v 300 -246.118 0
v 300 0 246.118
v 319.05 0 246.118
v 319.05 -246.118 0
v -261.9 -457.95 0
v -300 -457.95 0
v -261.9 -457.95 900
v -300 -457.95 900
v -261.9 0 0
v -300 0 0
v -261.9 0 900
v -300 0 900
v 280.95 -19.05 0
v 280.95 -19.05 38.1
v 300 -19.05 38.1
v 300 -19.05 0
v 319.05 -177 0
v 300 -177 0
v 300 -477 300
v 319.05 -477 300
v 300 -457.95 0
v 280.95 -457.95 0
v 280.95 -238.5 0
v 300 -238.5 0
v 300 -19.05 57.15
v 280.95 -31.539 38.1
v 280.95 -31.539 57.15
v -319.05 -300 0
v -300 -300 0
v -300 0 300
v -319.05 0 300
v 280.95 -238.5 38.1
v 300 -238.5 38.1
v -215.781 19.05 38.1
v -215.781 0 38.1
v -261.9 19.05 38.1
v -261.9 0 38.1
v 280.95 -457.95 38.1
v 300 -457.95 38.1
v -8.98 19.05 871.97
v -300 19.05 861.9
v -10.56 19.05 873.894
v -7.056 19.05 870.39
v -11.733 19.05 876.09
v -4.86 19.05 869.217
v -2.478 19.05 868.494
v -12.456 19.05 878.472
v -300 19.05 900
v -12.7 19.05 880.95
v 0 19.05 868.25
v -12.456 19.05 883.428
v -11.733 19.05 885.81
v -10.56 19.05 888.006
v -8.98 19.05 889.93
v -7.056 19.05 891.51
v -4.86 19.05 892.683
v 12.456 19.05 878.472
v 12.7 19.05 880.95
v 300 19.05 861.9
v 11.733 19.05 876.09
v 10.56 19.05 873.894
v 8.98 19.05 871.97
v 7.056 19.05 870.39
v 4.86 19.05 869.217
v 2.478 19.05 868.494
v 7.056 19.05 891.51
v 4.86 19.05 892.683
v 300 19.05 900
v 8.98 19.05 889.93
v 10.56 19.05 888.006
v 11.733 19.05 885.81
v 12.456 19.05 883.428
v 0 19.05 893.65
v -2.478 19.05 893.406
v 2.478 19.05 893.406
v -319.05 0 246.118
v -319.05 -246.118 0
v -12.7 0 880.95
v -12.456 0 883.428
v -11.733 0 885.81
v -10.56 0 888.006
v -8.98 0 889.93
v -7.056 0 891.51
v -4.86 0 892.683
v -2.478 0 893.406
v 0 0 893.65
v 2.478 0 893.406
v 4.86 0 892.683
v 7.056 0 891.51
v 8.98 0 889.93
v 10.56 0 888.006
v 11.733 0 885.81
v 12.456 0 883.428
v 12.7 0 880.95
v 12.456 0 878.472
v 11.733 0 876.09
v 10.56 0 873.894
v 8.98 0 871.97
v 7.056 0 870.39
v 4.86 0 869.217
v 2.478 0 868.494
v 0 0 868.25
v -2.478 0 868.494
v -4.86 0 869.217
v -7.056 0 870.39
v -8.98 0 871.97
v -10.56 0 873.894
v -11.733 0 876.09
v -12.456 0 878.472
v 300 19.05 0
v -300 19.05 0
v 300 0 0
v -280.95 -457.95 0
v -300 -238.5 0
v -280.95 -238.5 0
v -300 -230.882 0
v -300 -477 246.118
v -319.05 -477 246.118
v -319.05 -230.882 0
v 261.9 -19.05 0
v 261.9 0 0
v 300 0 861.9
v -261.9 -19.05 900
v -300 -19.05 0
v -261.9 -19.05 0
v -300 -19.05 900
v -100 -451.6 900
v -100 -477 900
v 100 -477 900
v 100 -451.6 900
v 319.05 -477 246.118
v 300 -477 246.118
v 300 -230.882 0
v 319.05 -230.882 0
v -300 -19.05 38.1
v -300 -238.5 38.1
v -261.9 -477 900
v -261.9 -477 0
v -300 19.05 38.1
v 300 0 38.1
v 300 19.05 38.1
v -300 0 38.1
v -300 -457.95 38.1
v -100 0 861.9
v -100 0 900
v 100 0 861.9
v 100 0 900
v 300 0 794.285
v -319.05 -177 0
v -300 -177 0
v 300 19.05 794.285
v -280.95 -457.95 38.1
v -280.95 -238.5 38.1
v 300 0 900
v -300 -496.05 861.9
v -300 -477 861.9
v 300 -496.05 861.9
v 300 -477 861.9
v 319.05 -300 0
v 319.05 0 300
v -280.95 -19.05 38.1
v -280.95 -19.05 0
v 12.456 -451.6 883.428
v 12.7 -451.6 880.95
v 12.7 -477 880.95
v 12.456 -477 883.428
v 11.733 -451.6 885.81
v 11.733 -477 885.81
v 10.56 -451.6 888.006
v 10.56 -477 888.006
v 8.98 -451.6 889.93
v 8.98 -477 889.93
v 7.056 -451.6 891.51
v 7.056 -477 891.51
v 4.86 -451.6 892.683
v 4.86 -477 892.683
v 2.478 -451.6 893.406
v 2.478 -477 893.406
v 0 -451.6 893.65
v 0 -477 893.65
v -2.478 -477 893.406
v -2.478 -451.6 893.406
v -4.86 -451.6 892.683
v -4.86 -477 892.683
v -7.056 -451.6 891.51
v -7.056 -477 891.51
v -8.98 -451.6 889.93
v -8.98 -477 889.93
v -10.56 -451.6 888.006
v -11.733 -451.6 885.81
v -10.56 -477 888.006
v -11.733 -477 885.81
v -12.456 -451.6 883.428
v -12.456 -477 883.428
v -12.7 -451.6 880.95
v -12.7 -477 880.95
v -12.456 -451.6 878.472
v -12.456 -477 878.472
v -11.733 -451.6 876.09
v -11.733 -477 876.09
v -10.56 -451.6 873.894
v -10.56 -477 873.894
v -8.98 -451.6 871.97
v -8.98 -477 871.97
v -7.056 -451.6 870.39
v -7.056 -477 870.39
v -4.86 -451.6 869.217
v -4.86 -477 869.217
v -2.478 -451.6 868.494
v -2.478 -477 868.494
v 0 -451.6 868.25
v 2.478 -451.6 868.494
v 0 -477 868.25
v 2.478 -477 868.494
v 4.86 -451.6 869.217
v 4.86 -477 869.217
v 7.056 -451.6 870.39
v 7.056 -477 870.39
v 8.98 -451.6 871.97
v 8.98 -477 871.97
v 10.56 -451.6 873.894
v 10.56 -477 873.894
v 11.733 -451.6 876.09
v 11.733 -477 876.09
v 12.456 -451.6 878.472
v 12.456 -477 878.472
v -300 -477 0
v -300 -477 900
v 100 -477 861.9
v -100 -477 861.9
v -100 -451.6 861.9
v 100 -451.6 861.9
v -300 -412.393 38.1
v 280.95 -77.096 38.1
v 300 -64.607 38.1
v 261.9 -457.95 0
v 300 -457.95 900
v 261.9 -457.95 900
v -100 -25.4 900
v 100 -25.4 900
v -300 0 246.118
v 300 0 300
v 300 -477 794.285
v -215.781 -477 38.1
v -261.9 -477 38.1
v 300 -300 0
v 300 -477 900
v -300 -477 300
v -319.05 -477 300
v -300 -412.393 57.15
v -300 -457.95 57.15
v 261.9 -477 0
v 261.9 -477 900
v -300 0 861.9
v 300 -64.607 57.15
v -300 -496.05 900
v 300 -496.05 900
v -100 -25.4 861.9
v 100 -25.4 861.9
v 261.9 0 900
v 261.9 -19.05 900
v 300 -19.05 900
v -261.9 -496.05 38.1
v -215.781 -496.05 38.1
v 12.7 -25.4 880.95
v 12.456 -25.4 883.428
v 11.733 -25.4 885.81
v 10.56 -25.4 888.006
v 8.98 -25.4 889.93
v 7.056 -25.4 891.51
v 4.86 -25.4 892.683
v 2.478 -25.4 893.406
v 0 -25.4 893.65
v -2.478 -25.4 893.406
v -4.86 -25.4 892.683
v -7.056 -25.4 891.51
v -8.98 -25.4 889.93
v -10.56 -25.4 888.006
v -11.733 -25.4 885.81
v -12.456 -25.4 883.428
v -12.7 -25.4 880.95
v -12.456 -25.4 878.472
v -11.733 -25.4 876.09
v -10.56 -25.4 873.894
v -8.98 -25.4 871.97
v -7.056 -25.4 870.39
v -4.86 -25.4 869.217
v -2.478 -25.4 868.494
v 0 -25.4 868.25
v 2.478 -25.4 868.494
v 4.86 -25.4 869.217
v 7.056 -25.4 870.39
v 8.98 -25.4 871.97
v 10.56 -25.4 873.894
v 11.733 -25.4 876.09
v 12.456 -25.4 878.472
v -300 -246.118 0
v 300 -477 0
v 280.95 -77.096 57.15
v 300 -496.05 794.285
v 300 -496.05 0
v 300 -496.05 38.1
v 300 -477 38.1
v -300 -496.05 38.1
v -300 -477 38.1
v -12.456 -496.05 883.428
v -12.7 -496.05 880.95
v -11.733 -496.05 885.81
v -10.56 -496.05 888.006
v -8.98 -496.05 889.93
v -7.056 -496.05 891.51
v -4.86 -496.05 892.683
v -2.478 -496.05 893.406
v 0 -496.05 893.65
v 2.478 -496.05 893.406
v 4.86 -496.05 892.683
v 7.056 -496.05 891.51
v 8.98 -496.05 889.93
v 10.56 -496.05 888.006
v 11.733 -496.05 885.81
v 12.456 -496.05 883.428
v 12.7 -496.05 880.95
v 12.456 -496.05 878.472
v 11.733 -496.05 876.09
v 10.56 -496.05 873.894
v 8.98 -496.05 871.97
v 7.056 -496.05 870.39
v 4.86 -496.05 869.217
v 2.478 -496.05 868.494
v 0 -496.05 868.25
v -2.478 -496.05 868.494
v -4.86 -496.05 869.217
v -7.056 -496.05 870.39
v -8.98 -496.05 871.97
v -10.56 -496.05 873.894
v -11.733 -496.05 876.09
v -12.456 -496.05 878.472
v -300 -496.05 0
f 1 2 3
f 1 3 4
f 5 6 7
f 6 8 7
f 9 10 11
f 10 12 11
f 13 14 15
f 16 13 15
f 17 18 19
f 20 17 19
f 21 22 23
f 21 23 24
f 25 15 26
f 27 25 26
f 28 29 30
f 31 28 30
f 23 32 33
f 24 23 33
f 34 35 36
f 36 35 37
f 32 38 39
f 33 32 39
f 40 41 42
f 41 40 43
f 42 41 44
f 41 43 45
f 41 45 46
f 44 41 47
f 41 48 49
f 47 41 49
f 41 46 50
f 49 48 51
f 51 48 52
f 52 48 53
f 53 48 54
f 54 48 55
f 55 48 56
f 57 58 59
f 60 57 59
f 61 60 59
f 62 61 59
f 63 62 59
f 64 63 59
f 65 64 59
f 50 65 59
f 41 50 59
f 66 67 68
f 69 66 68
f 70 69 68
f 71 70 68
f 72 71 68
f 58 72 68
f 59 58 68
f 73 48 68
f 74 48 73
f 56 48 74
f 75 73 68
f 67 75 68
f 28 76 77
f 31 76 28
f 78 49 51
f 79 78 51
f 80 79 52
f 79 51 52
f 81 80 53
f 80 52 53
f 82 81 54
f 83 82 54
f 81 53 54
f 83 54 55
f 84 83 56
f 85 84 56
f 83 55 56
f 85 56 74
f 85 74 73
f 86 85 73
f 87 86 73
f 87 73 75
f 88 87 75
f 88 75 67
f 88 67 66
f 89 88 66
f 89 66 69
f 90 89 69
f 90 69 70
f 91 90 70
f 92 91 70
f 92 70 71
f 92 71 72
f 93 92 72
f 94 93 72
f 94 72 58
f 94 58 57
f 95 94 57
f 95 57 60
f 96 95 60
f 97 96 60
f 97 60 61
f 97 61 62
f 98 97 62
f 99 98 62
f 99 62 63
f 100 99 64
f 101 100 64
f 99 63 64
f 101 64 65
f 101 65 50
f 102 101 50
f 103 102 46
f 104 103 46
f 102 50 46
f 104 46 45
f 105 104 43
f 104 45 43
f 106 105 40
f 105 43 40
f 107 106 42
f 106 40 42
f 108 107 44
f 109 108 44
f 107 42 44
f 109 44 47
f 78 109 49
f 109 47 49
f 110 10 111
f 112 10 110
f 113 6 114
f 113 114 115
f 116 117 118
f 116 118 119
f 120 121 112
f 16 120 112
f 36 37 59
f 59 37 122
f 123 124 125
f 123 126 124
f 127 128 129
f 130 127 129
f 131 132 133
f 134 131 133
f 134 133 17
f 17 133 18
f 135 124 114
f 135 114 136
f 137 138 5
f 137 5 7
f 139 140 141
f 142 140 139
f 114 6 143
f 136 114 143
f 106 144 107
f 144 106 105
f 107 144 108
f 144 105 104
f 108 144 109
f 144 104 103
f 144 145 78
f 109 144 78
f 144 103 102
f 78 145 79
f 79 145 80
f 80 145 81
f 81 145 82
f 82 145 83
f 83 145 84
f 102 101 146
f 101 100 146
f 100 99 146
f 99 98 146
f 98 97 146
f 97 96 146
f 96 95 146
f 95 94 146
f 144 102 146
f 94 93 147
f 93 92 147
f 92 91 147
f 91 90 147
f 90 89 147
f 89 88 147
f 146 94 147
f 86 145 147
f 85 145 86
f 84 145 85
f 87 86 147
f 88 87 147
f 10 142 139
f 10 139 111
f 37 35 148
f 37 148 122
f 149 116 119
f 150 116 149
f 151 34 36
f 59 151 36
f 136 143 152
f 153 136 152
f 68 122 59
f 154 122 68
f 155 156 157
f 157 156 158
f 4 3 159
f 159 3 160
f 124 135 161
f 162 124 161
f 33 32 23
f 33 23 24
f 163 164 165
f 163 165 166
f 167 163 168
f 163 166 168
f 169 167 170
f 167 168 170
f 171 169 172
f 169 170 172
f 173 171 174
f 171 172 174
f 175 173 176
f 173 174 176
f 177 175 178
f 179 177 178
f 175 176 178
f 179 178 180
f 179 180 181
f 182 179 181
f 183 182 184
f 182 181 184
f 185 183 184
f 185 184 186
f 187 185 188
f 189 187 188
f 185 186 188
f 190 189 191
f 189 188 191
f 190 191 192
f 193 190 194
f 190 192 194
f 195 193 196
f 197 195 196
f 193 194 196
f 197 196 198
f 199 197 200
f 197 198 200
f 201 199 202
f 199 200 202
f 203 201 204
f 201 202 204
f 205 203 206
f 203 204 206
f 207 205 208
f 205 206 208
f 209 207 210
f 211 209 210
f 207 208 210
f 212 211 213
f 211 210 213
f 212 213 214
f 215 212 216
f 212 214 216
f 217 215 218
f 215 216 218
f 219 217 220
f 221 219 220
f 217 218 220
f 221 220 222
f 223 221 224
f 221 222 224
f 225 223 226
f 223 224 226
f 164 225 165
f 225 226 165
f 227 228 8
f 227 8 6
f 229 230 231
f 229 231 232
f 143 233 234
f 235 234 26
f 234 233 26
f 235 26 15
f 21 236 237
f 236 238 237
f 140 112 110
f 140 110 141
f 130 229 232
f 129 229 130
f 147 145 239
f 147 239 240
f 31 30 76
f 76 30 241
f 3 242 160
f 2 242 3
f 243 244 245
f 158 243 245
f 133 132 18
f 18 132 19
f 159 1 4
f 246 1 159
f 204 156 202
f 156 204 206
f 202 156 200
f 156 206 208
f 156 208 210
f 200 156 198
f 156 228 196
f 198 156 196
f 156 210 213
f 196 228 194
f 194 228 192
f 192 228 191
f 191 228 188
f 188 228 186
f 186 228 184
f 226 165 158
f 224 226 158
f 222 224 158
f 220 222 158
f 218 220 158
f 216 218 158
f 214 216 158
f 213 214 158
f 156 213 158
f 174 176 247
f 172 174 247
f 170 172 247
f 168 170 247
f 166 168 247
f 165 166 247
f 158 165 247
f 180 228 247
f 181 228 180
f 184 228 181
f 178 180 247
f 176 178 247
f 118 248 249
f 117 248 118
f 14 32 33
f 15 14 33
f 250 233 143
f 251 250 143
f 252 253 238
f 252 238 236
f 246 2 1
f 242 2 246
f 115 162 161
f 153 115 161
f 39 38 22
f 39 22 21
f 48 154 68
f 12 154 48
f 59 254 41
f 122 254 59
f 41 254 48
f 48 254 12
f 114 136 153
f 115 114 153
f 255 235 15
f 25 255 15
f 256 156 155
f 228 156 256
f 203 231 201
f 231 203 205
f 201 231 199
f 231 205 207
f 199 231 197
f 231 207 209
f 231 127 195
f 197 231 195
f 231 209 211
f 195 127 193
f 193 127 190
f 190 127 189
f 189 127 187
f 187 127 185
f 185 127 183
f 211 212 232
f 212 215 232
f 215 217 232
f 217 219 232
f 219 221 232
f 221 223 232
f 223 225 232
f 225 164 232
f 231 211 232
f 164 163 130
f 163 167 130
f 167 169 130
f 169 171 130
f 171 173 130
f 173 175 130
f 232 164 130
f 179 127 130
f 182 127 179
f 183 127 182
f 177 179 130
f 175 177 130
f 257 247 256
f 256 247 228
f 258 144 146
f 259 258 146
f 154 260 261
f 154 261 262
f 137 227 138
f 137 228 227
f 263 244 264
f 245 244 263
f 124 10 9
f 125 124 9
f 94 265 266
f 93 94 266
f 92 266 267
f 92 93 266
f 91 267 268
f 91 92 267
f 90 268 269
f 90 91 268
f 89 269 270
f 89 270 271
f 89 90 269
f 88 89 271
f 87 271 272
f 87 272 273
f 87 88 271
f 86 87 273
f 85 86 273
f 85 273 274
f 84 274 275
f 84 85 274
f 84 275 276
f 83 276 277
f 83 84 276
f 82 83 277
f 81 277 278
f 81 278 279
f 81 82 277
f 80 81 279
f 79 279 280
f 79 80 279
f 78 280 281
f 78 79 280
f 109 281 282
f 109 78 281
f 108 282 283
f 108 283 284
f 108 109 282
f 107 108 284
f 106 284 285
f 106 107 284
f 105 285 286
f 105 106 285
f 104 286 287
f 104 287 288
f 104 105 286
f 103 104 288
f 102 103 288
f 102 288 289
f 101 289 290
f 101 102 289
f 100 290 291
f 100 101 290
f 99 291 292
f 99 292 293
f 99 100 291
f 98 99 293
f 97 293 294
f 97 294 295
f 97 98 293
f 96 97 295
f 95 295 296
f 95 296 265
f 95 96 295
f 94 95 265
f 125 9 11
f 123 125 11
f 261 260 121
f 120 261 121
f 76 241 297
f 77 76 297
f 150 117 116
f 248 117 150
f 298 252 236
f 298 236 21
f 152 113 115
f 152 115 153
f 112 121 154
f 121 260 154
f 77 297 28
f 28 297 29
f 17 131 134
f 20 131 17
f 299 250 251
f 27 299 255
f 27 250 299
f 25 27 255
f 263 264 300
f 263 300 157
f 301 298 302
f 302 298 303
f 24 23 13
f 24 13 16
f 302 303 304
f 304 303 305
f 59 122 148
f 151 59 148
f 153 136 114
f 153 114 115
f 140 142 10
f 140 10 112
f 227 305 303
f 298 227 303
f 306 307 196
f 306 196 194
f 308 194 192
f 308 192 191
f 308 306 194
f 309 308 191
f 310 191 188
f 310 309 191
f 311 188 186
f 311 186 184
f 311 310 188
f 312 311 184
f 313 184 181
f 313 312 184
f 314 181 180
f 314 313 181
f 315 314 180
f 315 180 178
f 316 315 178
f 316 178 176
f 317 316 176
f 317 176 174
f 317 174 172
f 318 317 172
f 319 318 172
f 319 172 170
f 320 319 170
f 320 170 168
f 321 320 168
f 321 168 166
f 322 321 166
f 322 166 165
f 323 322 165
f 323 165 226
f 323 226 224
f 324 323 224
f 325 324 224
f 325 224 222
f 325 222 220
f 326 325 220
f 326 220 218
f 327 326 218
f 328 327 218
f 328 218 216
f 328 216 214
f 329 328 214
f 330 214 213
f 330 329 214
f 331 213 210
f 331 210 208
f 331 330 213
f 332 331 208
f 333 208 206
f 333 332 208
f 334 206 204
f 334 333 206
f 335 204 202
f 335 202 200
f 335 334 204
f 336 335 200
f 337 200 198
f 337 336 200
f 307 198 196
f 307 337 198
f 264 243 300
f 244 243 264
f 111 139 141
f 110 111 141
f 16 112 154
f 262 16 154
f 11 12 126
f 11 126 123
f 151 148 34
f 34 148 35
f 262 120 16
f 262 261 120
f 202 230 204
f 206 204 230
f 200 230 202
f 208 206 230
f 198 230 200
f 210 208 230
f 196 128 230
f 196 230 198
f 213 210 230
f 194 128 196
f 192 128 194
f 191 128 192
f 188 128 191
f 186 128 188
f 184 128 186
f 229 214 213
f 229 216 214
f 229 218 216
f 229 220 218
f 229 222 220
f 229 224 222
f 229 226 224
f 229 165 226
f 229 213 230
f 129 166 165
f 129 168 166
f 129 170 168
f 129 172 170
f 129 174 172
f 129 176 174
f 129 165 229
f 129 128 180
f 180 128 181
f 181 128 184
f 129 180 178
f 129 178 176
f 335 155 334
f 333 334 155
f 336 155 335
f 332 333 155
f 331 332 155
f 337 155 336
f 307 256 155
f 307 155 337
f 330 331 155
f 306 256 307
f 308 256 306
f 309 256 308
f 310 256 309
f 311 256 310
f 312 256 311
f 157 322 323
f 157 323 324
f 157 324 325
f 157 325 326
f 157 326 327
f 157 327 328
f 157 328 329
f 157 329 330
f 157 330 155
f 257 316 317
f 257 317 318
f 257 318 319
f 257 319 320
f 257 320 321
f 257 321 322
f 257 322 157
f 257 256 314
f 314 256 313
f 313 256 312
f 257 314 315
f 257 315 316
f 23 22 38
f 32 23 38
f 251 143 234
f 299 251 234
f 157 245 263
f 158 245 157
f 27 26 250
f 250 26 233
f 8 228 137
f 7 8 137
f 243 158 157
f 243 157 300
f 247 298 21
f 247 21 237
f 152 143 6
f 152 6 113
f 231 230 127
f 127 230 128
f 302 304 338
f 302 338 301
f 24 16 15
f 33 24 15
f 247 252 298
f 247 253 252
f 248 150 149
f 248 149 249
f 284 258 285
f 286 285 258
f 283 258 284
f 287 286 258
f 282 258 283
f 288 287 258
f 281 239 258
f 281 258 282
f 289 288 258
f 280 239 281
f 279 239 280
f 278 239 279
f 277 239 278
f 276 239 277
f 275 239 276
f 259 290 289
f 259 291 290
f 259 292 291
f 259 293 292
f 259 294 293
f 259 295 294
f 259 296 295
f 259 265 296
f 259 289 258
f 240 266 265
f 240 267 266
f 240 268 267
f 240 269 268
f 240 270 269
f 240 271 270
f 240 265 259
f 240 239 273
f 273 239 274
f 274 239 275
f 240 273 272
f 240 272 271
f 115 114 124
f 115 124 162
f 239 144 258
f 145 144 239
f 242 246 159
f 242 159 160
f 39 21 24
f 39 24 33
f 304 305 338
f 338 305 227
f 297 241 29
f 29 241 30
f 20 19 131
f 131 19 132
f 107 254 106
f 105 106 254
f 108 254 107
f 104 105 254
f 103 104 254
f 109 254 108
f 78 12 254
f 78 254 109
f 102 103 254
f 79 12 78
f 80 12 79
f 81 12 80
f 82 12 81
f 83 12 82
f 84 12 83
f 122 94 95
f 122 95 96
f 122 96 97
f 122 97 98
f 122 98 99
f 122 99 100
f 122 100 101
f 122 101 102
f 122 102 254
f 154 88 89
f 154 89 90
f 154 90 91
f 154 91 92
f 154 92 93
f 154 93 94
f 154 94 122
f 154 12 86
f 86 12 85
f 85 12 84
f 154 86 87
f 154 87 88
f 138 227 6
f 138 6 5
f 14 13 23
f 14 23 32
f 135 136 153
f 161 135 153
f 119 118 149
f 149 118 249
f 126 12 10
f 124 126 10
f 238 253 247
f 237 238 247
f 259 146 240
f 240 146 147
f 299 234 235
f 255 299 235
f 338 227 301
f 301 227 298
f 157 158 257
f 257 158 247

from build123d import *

# Parameters (mm, degrees)
F0_W      = 38.1
F0_H      = 38.1
F0_W_2    = 523.8
F1_DEPTH  = 19.05
F2_W      = 38.1
F2_H      = 861.9
F2_H_2    = 38.1
F3_DEPTH  = 19.05
F5_DEPTH  = 19.05
F6_R      = 12.7
F7_DEPTH  = 25
F8_W      = 19.05
F8_H      = 38.1
F9_DEPTH  = 219.45
F11_DEPTH = 19.05
F12_W     = 200
F12_H     = 38.1
F12_R     = 12.7
F13_DEPTH = 25.4
F17_DEPTH = 19.05


with BuildPart() as f1:
    # F0 (on Front) → F1 (new body)
    with BuildSketch(Plane.XZ):
        with Locations((-280.95, 880.95)):
            Rectangle(F0_W, F0_H)
        with Locations((0, 880.95)):
            Rectangle(F0_W_2, F0_H)
        with Locations((280.95, 880.95)):
            Rectangle(F0_W, F0_H)
    extrude(amount=-F1_DEPTH)

    # F6 (on face) → F7 (cut)
    with BuildSketch(Plane(origin=(0, 19.05, 0), x_dir=(-1, 0, 0), z_dir=(0, 1, 0))):
        with Locations((0, 880.95)):
            Circle(F6_R)
    extrude(amount=-F7_DEPTH, mode=Mode.SUBTRACT)


with BuildPart() as f1b:
    # F0 (on Front) → F1, piece 2 (new body)
    with BuildSketch(Plane.XZ):
        Polygon((-300, 38.1), (-300, 0), (300, 0), (300, 38.1), (261.9, 38.1), (-261.9, 38.1), align=None)
    extrude(amount=-F1_DEPTH)


with BuildPart() as f3:
    # F2 (on face) → F3 (new body)
    with BuildSketch(Plane.XZ):
        with Locations((-280.95, 430.95)):
            Rectangle(F2_W, F2_H)
        with Locations((-280.95, 880.95)):
            Rectangle(F2_W, F2_H_2)
    extrude(amount=F3_DEPTH)


with BuildPart() as f3b:
    # F2 (on face) → F3, piece 2 (new body)
    with BuildSketch(Plane.XZ):
        with Locations((280.95, 430.95)):
            Rectangle(F2_W, F2_H)
        with Locations((280.95, 880.95)):
            Rectangle(F2_W, F2_H_2)
    extrude(amount=F3_DEPTH)


with BuildPart() as f5:
    # F4 (on face) → F5 (new body)
    with BuildSketch(Plane(origin=(0, 0, 0), x_dir=(-1, 0, 0), z_dir=(0, 1, 0))):
        Polygon((-261.9, 806.041697811), (-300, 861.9), (-300, 794.285209285), (-261.9, 738.426907096), align=None)
        Polygon((261.9, 38.1), (-261.9, 806.041697811), (-261.9, 738.426907096), (215.7810986856, 38.1), align=None)
    extrude(amount=F5_DEPTH)


with BuildPart() as f9:
    # F8 (on face) → F9 (new body)
    with BuildSketch(Plane.XZ.offset(19.05)):
        with Locations((-290.475, 19.05)):
            Rectangle(F8_W, F8_H)
    extrude(amount=F9_DEPTH)


with BuildPart() as f9b:
    # F8 (on face) → F9, piece 2 (new body)
    with BuildSketch(Plane.XZ.offset(19.05)):
        with Locations((290.475, 19.05)):
            Rectangle(F8_W, F8_H)
    extrude(amount=F9_DEPTH)


with BuildPart() as f11:
    # F10 (on face) → F11 (new body)
    with BuildSketch(Plane(origin=(-300, 0, 0), x_dir=(0, -1, 0), z_dir=(-1, 0, 0))):
        Polygon((300, 0), (19.05, 280.95), (19.05, 227.0684632736), (246.1184632736, 0), align=None)
        Polygon((19.05, 280.95), (0, 300), (0, 246.1184632736), (19.05, 227.0684632736), align=None)
    extrude(amount=F11_DEPTH)


with BuildPart() as f13:
    # F12 (on face) → F13 (new body)
    with BuildSketch(Plane.XZ):
        with Locations((0, 880.95)):
            Rectangle(F12_W, F12_H)
        with Locations((0, 880.95)):
            Circle(F12_R, mode=Mode.SUBTRACT)
    extrude(amount=F13_DEPTH)


with BuildPart() as f14_1:
    # F14: instance of F11
    add(f11.part.mirror(Plane.YZ))


with BuildPart() as f15_1:
    # F15: instance of F1b
    add(f1b.part.mirror(Plane(origin=(-290.475, -238.5, 19.05), x_dir=(1, 0, 0), z_dir=(0, -1, 0))))


with BuildPart() as f15_2:
    # F15: instance of F1
    add(f1.part.mirror(Plane(origin=(-290.475, -238.5, 19.05), x_dir=(1, 0, 0), z_dir=(0, -1, 0))))


with BuildPart() as f15_3:
    # F15: instance of F3
    add(f3.part.mirror(Plane(origin=(-290.475, -238.5, 19.05), x_dir=(1, 0, 0), z_dir=(0, -1, 0))))


with BuildPart() as f15_4:
    # F15: instance of F3b
    add(f3b.part.mirror(Plane(origin=(-290.475, -238.5, 19.05), x_dir=(1, 0, 0), z_dir=(0, -1, 0))))


with BuildPart() as f15_5:
    # F15: instance of F5
    add(f5.part.mirror(Plane(origin=(-290.475, -238.5, 19.05), x_dir=(1, 0, 0), z_dir=(0, -1, 0))))


with BuildPart() as f15_6:
    # F15: instance of F9
    add(f9.part.mirror(Plane(origin=(-290.475, -238.5, 19.05), x_dir=(1, 0, 0), z_dir=(0, -1, 0))))


with BuildPart() as f15_7:
    # F15: instance of F9b
    add(f9b.part.mirror(Plane(origin=(-290.475, -238.5, 19.05), x_dir=(1, 0, 0), z_dir=(0, -1, 0))))


with BuildPart() as f15_8:
    # F15: instance of F11
    add(f11.part.mirror(Plane(origin=(-290.475, -238.5, 19.05), x_dir=(1, 0, 0), z_dir=(0, -1, 0))))


with BuildPart() as f15_9:
    # F15: instance of F14_1
    add(f14_1.part.mirror(Plane(origin=(-290.475, -238.5, 19.05), x_dir=(1, 0, 0), z_dir=(0, -1, 0))))


with BuildPart() as f15_10:
    # F15: instance of F13
    add(f13.part.mirror(Plane(origin=(-290.475, -238.5, 19.05), x_dir=(1, 0, 0), z_dir=(0, -1, 0))))


with BuildPart() as f17:
    # F16 (on face) → F17 (new body)
    with BuildSketch(Plane.XY.offset(38.1)):
        Polygon((280.95, -77.0959924044), (280.95, -31.5386287025), (-300, -412.392636298), (-300, -457.95), align=None)
        Polygon((300, -64.607363702), (300, -19.05), (280.95, -31.5386287025), (280.95, -77.0959924044), align=None)
    extrude(amount=F17_DEPTH)


solid = Compound([f1.part, f1b.part, f3.part, f3b.part, f5.part, f9.part, f9b.part, f11.part, f13.part, f14_1.part, f15_1.part, f15_2.part, f15_3.part, f15_4.part, f15_5.part, f15_6.part, f15_7.part, f15_8.part, f15_9.part, f15_10.part, f17.part])
